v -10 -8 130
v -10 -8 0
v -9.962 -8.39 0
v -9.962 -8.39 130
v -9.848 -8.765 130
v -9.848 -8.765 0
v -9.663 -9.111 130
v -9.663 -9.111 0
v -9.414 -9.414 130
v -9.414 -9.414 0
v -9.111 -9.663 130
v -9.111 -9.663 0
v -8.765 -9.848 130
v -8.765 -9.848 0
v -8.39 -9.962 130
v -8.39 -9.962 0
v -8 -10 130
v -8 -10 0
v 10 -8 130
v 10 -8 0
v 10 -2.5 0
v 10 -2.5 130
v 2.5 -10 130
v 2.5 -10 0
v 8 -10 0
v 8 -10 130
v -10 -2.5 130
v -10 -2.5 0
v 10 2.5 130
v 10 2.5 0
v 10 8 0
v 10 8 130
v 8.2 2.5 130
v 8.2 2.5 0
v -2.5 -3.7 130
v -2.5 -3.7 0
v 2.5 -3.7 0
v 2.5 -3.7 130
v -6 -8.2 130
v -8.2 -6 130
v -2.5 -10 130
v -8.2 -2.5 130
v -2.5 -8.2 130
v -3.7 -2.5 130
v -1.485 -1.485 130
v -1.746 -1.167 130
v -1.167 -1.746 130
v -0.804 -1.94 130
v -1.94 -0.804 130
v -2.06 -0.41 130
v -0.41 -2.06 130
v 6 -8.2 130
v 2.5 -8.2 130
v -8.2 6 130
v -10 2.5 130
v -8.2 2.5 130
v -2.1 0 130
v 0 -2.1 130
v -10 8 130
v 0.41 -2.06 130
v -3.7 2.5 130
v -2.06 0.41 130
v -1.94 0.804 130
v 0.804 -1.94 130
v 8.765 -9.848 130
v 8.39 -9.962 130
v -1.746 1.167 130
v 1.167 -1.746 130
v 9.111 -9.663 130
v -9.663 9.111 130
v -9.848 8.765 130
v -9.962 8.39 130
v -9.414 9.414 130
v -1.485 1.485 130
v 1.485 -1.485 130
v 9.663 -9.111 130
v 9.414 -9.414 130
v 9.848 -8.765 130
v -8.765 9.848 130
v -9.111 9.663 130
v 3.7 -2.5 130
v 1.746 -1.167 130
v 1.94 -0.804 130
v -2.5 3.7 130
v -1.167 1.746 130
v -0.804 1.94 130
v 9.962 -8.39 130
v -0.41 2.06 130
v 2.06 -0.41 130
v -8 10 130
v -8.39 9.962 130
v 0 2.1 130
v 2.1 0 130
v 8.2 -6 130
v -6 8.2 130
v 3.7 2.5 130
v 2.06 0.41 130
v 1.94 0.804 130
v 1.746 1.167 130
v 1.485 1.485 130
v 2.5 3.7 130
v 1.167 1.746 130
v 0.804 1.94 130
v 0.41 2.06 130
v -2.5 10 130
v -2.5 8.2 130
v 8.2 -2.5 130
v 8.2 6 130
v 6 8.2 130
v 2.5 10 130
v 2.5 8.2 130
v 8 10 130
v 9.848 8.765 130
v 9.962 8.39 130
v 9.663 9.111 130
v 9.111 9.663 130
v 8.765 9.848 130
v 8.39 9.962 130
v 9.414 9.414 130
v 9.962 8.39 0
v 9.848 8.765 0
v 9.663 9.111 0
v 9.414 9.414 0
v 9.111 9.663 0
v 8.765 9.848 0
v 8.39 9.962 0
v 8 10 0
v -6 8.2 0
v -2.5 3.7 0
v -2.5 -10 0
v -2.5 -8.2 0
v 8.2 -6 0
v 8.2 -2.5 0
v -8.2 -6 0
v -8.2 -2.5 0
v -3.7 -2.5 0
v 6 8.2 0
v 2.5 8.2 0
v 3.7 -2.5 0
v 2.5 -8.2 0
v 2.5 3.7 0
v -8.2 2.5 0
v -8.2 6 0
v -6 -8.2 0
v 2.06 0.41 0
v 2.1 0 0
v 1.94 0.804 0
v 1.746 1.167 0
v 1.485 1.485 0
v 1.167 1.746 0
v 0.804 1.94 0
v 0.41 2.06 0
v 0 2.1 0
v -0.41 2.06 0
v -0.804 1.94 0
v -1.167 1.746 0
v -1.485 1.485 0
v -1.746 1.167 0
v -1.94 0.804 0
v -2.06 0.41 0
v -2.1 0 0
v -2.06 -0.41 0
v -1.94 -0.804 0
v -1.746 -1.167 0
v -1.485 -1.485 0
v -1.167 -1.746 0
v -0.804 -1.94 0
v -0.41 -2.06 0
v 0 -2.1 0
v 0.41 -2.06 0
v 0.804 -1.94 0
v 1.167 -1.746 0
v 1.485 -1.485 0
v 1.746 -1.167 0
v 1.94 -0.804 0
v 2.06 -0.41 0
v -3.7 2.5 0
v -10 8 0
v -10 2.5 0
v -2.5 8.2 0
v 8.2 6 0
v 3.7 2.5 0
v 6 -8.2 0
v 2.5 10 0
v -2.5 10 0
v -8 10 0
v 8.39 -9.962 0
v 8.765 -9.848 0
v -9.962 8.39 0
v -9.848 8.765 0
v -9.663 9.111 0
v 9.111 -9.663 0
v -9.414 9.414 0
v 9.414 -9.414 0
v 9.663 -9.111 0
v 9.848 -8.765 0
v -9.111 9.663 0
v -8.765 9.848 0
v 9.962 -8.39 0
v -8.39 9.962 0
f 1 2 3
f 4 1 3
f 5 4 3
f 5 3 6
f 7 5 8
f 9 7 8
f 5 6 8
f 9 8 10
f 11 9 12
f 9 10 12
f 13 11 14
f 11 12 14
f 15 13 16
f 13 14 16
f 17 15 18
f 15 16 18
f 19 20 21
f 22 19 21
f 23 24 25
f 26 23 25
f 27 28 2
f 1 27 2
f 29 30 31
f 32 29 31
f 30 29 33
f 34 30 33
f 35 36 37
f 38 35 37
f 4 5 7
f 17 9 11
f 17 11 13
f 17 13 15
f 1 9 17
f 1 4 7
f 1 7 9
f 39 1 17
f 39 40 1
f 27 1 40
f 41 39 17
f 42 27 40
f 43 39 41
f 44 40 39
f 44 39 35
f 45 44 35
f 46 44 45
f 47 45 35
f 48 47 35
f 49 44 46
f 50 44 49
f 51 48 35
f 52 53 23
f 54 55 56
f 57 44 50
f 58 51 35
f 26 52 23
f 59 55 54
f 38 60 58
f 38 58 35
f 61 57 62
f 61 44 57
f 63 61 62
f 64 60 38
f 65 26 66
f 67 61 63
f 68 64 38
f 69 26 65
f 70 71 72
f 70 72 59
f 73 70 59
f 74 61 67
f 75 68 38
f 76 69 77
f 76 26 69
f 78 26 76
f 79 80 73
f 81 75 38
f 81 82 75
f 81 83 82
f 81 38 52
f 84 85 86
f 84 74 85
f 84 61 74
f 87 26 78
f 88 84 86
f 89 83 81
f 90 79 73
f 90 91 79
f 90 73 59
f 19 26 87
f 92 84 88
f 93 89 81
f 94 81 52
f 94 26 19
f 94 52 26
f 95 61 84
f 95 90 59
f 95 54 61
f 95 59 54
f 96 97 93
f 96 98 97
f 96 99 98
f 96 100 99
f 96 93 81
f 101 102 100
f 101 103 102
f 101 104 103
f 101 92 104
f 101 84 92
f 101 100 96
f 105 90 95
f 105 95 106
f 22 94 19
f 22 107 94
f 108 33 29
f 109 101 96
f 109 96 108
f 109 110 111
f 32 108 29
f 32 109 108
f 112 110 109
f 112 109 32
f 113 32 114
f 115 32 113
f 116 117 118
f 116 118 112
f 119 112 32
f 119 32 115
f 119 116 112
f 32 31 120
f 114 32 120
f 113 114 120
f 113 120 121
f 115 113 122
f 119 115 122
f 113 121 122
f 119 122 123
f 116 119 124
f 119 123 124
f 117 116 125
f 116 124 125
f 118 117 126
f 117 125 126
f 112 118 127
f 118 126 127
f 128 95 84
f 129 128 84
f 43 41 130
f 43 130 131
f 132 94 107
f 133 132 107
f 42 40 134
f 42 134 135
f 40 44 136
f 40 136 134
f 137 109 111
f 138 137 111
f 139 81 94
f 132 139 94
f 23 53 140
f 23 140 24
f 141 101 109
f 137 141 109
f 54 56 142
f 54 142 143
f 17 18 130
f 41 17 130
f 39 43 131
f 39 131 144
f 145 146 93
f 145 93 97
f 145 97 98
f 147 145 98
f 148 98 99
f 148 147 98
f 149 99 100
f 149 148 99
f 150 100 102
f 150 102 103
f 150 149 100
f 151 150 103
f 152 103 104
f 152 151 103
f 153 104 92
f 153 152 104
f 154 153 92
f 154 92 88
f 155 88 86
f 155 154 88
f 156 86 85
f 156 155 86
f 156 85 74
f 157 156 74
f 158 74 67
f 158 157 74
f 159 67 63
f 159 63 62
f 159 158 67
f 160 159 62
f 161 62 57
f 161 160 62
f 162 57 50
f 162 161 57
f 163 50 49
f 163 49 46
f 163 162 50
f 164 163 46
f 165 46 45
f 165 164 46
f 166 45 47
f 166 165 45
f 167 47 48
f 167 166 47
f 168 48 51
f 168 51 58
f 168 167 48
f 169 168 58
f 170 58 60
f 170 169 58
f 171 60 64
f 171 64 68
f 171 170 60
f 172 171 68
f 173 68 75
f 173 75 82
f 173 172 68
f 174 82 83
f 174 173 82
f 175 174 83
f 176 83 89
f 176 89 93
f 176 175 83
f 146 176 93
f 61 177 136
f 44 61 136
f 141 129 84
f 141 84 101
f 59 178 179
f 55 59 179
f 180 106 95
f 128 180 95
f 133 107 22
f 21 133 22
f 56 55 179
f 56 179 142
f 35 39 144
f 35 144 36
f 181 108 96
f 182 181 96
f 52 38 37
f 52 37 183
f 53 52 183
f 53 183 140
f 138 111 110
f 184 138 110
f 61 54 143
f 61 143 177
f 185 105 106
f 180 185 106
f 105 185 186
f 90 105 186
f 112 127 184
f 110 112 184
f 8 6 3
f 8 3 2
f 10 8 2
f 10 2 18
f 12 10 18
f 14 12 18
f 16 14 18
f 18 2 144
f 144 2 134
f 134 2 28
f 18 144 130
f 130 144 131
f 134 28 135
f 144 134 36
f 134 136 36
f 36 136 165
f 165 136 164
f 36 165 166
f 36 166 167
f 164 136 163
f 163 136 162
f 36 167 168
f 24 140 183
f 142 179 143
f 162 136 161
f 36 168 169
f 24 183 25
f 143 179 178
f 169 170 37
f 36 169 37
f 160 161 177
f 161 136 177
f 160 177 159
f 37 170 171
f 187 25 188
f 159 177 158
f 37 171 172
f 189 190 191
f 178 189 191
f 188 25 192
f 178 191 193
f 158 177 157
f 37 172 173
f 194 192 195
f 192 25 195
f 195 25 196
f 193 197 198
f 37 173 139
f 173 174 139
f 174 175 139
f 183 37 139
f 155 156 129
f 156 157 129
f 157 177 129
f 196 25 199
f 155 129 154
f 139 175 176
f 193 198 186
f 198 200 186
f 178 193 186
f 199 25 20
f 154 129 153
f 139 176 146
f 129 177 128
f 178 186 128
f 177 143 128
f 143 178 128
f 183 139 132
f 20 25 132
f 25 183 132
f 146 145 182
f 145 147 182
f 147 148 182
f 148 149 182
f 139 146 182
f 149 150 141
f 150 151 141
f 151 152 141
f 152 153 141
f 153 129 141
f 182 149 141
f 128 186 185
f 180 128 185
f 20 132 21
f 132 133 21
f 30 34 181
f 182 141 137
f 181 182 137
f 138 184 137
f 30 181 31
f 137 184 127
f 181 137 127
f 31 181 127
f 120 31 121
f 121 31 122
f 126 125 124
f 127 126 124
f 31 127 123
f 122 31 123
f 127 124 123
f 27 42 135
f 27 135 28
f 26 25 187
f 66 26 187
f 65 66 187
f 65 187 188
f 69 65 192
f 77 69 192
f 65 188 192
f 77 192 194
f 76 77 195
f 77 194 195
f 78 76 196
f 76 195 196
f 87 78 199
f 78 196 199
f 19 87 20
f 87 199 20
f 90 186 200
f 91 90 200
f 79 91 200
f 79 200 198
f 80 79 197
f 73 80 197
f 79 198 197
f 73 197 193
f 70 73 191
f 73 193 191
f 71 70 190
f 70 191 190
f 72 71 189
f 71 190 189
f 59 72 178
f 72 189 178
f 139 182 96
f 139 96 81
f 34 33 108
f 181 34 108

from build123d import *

# Parameters (mm, degrees)
EXTRUSION1_DEPTH        = 130
PER_AGE1_OUTLINE_R      = 2.1
PER_AGE1_DEPTH          = 130
ENL_V_MAT_EXTRU_1_DEPTH = 300
ENL_V_MAT_EXTRU_3_DEPTH = 300
ENL_V_MAT_EXTRU_4_DEPTH = 131.766968306
ENL_V_MAT_EXTRU_7_DEPTH = 131.766968306


# Read off the part's stored shape, not the designer's step: Perçage1
with BuildPart() as part:
    # Esquisse1 → Extrusion1 (new body)
    with BuildSketch(Plane.XY):
        with BuildLine():
            Line((-10, 8), (-10, -8))
            ThreePointArc((-10, -8), (-9.414213562, -9.414213562), (-8, -10))
            Line((-8, -10), (8, -10))
            ThreePointArc((8, -10), (9.414213562, -9.414213562), (10, -8))
            Line((10, -8), (10, 8))
            ThreePointArc((10, 8), (9.414213562, 9.414213562), (8, 10))
            Line((8, 10), (-8, 10))
            ThreePointArc((-8, 10), (-9.414213562, 9.414213562), (-10, 8))
        make_face()
    extrude(amount=EXTRUSION1_DEPTH)

    # Perçage1 outline → Perçage1 (cut)
    with BuildSketch(Plane.XY):
        Circle(PER_AGE1_OUTLINE_R)
    extrude(amount=PER_AGE1_DEPTH, mode=Mode.SUBTRACT)

    # Esquisse3 → Enlèv. mat.-Extru.1 (cut)
    with BuildSketch(Plane.XY.offset(130)):
        Polygon((10, 2.5), (8.2, 2.5), (8.2, 6), (3.7, 2.5), (3.7, -2.5), (8.2, -6), (8.2, -2.5), (10, -2.5), align=None)
    extrude(amount=-ENL_V_MAT_EXTRU_1_DEPTH, mode=Mode.SUBTRACT)

    # Esquisse5 → Enlèv. mat.-Extru.3 (cut)
    with BuildSketch(Plane.XY.offset(130)):
        Polygon((-2.5, 10), (-2.5, 8.2), (-6, 8.2), (-2.5, 3.7), (2.5, 3.7), (6, 8.2), (2.5, 8.2), (2.5, 10), align=None)
    extrude(amount=-ENL_V_MAT_EXTRU_3_DEPTH, mode=Mode.SUBTRACT)

    # Esquisse6 → Enlèv. mat.-Extru.4 (cut, through all)
    with BuildSketch(Plane.XY.offset(130)):
        Polygon((-2.5, -10), (-2.5, -8.2), (-6, -8.2), (-2.5, -3.7), (2.5, -3.7), (6, -8.2), (2.5, -8.2), (2.5, -10), align=None)
    extrude(amount=-ENL_V_MAT_EXTRU_4_DEPTH, mode=Mode.SUBTRACT)

    # Esquisse4 → Enlèv. mat.-Extru.7 (cut, through all)
    with BuildSketch(Plane.XY.offset(130)):
        Polygon((-10, 2.5), (-8.2, 2.5), (-8.2, 6), (-3.7, 2.5), (-3.7, -2.5), (-8.2, -6), (-8.2, -2.5), (-10, -2.5), align=None)
    extrude(amount=-ENL_V_MAT_EXTRU_7_DEPTH, mode=Mode.SUBTRACT)


solid = part.part
